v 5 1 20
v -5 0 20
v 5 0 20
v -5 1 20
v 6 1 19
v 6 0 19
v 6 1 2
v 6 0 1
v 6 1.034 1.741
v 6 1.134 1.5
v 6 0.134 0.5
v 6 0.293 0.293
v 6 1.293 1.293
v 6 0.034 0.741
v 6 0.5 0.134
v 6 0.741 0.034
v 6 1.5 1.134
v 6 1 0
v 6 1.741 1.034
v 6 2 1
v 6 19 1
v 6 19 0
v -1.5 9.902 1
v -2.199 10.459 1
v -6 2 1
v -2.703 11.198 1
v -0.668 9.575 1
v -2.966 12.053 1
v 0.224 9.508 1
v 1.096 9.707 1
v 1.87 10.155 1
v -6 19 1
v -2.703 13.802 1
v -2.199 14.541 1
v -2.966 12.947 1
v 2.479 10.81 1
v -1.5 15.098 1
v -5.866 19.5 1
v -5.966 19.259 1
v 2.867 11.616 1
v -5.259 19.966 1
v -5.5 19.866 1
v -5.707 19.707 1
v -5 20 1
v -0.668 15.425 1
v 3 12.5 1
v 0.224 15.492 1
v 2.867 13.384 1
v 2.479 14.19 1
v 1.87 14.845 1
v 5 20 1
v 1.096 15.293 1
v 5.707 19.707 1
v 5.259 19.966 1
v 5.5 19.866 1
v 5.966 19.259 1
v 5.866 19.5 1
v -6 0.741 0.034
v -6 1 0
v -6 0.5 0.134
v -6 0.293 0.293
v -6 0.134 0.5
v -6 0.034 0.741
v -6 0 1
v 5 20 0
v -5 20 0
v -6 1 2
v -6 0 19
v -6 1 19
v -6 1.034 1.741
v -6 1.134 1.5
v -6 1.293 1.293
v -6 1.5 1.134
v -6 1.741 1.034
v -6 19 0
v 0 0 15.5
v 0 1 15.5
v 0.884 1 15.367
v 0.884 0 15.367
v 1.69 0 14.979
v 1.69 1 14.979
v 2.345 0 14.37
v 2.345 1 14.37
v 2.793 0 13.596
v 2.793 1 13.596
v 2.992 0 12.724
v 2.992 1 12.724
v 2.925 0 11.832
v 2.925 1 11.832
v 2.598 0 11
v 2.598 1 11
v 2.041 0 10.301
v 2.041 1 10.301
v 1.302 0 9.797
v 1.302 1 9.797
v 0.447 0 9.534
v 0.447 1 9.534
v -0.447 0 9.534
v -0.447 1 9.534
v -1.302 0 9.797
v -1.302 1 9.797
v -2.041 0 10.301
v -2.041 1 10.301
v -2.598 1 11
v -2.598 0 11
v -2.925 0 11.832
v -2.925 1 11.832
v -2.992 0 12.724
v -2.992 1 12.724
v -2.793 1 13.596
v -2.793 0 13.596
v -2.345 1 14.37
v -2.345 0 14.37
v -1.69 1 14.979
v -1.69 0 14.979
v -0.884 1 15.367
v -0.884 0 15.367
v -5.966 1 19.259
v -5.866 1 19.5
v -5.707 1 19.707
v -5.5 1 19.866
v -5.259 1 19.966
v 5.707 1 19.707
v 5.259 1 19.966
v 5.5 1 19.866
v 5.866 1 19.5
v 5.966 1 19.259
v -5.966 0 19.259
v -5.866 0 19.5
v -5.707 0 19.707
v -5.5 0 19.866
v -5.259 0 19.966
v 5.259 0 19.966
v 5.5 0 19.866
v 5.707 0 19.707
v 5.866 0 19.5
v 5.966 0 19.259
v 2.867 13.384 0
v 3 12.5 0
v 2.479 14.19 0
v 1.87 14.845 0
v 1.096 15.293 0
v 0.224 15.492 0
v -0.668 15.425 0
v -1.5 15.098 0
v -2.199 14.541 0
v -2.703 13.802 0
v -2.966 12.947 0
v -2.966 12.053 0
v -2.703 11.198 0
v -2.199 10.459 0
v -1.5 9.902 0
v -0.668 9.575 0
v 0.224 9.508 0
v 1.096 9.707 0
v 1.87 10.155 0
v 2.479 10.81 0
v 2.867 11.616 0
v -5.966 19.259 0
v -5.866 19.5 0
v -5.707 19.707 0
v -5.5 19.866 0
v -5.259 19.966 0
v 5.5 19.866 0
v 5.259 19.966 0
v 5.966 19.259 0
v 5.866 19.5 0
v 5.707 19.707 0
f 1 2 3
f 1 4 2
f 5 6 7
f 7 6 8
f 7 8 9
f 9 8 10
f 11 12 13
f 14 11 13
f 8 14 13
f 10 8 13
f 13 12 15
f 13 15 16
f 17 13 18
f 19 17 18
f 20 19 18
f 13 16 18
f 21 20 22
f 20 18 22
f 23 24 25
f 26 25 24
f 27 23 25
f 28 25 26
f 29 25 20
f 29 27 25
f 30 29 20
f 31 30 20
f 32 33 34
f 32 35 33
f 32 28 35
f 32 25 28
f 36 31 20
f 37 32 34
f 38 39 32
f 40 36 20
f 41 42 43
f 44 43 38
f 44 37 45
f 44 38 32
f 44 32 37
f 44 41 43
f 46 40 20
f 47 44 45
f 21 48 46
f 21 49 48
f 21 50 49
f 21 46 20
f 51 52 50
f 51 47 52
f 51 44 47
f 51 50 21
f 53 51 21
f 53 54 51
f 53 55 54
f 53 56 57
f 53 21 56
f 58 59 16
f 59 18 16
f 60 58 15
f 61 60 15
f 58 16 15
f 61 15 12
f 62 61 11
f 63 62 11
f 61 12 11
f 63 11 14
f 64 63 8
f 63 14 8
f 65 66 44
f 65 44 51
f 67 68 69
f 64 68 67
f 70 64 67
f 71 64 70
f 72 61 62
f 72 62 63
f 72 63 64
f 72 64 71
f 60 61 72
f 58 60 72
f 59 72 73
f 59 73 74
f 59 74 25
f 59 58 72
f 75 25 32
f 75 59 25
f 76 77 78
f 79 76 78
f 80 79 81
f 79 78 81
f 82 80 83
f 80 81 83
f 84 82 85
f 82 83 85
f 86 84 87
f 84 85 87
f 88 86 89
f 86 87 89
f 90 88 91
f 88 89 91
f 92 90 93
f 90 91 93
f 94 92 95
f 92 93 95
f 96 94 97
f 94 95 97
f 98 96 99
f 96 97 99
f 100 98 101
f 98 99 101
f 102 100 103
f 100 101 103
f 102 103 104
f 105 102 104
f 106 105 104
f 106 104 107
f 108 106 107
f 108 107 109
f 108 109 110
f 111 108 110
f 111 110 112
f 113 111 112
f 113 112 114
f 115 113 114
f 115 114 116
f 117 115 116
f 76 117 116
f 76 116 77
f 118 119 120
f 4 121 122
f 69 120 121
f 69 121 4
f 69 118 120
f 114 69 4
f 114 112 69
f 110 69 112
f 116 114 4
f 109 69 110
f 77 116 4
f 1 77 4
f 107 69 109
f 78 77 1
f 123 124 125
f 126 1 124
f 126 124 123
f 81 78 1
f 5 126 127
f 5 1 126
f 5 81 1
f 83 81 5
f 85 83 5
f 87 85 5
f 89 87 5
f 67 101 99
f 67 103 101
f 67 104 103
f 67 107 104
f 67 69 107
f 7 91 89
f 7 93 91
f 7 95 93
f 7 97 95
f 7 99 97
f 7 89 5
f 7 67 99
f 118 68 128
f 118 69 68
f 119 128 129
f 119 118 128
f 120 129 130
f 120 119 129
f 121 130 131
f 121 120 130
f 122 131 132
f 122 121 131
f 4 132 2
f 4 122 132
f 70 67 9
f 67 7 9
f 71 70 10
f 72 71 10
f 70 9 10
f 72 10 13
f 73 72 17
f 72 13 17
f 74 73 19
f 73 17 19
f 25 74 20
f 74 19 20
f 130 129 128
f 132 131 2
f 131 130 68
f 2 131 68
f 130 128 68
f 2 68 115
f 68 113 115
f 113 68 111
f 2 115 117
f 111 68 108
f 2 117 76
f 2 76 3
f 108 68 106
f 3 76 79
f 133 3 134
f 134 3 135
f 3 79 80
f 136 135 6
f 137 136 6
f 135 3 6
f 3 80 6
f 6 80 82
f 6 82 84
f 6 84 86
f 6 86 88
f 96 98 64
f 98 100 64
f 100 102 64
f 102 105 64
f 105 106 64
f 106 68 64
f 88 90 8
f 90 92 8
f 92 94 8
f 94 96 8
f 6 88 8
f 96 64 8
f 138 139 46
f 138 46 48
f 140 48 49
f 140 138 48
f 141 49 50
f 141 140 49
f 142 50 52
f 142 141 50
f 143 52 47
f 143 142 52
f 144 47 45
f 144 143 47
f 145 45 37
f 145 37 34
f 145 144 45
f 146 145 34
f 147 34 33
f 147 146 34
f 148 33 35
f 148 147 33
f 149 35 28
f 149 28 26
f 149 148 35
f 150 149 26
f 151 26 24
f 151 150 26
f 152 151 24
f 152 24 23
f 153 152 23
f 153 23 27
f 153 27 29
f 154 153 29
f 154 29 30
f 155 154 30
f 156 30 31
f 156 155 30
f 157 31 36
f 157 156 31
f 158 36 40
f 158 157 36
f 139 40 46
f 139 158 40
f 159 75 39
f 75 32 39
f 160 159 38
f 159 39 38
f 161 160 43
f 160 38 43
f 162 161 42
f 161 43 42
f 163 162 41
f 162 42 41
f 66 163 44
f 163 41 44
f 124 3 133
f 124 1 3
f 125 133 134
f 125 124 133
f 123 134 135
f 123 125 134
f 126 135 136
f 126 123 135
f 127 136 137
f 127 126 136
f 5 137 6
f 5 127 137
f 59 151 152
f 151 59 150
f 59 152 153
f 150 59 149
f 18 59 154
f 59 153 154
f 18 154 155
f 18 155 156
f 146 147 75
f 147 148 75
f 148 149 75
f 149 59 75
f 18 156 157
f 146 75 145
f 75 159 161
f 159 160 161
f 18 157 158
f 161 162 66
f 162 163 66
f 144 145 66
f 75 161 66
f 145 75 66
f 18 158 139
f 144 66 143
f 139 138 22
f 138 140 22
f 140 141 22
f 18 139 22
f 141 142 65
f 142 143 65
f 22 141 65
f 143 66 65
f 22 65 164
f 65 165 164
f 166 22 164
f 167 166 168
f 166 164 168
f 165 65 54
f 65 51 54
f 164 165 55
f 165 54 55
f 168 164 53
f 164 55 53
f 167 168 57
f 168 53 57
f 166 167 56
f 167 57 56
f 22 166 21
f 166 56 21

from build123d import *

# Parameters (mm, degrees)
ESQUISSE1_W             = 12
ESQUISSE1_H             = 20
ESQUISSE1_R             = 3
BOSS_EXTRU_1_DEPTH      = 1
ESQUISSE2_W             = 12
ESQUISSE2_H             = 1
BOSS_EXTRU_2_DEPTH      = 19
ESQUISSE3_R             = 3
ENL_V_MAT_EXTRU_1_DEPTH = 19
CONG_1_R                = 1
CONG_2_R                = 1


with BuildPart() as part:
    # Esquisse1 → Boss.-Extru.1 (new body)
    with BuildSketch(Plane.XY):
        with Locations((0, 10)):
            Rectangle(ESQUISSE1_W, ESQUISSE1_H)
        with Locations((0, 12.5)):
            Circle(ESQUISSE1_R, mode=Mode.SUBTRACT)
    extrude(amount=BOSS_EXTRU_1_DEPTH)

    # Esquisse2 → Boss.-Extru.2 (add)
    with BuildSketch(Plane.XY.offset(1)):
        with Locations((0, 0.5)):
            Rectangle(ESQUISSE2_W, ESQUISSE2_H)
    extrude(amount=BOSS_EXTRU_2_DEPTH)

    # Esquisse3 → Enlèv. mat.-Extru.1 (cut)
    with BuildSketch(Plane(origin=(0, 1, 0), x_dir=(1, 0, 0), z_dir=(0, 1, 0))):
        with Locations(Location((0, -12.5, 0), (0, 0, 270))):
            Circle(ESQUISSE3_R)
    extrude(amount=-ENL_V_MAT_EXTRU_1_DEPTH, mode=Mode.SUBTRACT)

    # Congé1
    cong_1_edges = [part.edges().sort_by_distance(p)[0] for p in [
        (0, 1, 1),
        (0, 0, 0),
    ]]
    fillet(cong_1_edges, radius=CONG_1_R)

    # Congé2
    cong_2_edges = [part.edges().sort_by_distance(p)[0] for p in [
        (-6, 0.5, 20),
        (6, 0.5, 20),
        (-6, 20, 0.5),
        (6, 20, 0.5),
    ]]
    fillet(cong_2_edges, radius=CONG_2_R)


solid = part.part
